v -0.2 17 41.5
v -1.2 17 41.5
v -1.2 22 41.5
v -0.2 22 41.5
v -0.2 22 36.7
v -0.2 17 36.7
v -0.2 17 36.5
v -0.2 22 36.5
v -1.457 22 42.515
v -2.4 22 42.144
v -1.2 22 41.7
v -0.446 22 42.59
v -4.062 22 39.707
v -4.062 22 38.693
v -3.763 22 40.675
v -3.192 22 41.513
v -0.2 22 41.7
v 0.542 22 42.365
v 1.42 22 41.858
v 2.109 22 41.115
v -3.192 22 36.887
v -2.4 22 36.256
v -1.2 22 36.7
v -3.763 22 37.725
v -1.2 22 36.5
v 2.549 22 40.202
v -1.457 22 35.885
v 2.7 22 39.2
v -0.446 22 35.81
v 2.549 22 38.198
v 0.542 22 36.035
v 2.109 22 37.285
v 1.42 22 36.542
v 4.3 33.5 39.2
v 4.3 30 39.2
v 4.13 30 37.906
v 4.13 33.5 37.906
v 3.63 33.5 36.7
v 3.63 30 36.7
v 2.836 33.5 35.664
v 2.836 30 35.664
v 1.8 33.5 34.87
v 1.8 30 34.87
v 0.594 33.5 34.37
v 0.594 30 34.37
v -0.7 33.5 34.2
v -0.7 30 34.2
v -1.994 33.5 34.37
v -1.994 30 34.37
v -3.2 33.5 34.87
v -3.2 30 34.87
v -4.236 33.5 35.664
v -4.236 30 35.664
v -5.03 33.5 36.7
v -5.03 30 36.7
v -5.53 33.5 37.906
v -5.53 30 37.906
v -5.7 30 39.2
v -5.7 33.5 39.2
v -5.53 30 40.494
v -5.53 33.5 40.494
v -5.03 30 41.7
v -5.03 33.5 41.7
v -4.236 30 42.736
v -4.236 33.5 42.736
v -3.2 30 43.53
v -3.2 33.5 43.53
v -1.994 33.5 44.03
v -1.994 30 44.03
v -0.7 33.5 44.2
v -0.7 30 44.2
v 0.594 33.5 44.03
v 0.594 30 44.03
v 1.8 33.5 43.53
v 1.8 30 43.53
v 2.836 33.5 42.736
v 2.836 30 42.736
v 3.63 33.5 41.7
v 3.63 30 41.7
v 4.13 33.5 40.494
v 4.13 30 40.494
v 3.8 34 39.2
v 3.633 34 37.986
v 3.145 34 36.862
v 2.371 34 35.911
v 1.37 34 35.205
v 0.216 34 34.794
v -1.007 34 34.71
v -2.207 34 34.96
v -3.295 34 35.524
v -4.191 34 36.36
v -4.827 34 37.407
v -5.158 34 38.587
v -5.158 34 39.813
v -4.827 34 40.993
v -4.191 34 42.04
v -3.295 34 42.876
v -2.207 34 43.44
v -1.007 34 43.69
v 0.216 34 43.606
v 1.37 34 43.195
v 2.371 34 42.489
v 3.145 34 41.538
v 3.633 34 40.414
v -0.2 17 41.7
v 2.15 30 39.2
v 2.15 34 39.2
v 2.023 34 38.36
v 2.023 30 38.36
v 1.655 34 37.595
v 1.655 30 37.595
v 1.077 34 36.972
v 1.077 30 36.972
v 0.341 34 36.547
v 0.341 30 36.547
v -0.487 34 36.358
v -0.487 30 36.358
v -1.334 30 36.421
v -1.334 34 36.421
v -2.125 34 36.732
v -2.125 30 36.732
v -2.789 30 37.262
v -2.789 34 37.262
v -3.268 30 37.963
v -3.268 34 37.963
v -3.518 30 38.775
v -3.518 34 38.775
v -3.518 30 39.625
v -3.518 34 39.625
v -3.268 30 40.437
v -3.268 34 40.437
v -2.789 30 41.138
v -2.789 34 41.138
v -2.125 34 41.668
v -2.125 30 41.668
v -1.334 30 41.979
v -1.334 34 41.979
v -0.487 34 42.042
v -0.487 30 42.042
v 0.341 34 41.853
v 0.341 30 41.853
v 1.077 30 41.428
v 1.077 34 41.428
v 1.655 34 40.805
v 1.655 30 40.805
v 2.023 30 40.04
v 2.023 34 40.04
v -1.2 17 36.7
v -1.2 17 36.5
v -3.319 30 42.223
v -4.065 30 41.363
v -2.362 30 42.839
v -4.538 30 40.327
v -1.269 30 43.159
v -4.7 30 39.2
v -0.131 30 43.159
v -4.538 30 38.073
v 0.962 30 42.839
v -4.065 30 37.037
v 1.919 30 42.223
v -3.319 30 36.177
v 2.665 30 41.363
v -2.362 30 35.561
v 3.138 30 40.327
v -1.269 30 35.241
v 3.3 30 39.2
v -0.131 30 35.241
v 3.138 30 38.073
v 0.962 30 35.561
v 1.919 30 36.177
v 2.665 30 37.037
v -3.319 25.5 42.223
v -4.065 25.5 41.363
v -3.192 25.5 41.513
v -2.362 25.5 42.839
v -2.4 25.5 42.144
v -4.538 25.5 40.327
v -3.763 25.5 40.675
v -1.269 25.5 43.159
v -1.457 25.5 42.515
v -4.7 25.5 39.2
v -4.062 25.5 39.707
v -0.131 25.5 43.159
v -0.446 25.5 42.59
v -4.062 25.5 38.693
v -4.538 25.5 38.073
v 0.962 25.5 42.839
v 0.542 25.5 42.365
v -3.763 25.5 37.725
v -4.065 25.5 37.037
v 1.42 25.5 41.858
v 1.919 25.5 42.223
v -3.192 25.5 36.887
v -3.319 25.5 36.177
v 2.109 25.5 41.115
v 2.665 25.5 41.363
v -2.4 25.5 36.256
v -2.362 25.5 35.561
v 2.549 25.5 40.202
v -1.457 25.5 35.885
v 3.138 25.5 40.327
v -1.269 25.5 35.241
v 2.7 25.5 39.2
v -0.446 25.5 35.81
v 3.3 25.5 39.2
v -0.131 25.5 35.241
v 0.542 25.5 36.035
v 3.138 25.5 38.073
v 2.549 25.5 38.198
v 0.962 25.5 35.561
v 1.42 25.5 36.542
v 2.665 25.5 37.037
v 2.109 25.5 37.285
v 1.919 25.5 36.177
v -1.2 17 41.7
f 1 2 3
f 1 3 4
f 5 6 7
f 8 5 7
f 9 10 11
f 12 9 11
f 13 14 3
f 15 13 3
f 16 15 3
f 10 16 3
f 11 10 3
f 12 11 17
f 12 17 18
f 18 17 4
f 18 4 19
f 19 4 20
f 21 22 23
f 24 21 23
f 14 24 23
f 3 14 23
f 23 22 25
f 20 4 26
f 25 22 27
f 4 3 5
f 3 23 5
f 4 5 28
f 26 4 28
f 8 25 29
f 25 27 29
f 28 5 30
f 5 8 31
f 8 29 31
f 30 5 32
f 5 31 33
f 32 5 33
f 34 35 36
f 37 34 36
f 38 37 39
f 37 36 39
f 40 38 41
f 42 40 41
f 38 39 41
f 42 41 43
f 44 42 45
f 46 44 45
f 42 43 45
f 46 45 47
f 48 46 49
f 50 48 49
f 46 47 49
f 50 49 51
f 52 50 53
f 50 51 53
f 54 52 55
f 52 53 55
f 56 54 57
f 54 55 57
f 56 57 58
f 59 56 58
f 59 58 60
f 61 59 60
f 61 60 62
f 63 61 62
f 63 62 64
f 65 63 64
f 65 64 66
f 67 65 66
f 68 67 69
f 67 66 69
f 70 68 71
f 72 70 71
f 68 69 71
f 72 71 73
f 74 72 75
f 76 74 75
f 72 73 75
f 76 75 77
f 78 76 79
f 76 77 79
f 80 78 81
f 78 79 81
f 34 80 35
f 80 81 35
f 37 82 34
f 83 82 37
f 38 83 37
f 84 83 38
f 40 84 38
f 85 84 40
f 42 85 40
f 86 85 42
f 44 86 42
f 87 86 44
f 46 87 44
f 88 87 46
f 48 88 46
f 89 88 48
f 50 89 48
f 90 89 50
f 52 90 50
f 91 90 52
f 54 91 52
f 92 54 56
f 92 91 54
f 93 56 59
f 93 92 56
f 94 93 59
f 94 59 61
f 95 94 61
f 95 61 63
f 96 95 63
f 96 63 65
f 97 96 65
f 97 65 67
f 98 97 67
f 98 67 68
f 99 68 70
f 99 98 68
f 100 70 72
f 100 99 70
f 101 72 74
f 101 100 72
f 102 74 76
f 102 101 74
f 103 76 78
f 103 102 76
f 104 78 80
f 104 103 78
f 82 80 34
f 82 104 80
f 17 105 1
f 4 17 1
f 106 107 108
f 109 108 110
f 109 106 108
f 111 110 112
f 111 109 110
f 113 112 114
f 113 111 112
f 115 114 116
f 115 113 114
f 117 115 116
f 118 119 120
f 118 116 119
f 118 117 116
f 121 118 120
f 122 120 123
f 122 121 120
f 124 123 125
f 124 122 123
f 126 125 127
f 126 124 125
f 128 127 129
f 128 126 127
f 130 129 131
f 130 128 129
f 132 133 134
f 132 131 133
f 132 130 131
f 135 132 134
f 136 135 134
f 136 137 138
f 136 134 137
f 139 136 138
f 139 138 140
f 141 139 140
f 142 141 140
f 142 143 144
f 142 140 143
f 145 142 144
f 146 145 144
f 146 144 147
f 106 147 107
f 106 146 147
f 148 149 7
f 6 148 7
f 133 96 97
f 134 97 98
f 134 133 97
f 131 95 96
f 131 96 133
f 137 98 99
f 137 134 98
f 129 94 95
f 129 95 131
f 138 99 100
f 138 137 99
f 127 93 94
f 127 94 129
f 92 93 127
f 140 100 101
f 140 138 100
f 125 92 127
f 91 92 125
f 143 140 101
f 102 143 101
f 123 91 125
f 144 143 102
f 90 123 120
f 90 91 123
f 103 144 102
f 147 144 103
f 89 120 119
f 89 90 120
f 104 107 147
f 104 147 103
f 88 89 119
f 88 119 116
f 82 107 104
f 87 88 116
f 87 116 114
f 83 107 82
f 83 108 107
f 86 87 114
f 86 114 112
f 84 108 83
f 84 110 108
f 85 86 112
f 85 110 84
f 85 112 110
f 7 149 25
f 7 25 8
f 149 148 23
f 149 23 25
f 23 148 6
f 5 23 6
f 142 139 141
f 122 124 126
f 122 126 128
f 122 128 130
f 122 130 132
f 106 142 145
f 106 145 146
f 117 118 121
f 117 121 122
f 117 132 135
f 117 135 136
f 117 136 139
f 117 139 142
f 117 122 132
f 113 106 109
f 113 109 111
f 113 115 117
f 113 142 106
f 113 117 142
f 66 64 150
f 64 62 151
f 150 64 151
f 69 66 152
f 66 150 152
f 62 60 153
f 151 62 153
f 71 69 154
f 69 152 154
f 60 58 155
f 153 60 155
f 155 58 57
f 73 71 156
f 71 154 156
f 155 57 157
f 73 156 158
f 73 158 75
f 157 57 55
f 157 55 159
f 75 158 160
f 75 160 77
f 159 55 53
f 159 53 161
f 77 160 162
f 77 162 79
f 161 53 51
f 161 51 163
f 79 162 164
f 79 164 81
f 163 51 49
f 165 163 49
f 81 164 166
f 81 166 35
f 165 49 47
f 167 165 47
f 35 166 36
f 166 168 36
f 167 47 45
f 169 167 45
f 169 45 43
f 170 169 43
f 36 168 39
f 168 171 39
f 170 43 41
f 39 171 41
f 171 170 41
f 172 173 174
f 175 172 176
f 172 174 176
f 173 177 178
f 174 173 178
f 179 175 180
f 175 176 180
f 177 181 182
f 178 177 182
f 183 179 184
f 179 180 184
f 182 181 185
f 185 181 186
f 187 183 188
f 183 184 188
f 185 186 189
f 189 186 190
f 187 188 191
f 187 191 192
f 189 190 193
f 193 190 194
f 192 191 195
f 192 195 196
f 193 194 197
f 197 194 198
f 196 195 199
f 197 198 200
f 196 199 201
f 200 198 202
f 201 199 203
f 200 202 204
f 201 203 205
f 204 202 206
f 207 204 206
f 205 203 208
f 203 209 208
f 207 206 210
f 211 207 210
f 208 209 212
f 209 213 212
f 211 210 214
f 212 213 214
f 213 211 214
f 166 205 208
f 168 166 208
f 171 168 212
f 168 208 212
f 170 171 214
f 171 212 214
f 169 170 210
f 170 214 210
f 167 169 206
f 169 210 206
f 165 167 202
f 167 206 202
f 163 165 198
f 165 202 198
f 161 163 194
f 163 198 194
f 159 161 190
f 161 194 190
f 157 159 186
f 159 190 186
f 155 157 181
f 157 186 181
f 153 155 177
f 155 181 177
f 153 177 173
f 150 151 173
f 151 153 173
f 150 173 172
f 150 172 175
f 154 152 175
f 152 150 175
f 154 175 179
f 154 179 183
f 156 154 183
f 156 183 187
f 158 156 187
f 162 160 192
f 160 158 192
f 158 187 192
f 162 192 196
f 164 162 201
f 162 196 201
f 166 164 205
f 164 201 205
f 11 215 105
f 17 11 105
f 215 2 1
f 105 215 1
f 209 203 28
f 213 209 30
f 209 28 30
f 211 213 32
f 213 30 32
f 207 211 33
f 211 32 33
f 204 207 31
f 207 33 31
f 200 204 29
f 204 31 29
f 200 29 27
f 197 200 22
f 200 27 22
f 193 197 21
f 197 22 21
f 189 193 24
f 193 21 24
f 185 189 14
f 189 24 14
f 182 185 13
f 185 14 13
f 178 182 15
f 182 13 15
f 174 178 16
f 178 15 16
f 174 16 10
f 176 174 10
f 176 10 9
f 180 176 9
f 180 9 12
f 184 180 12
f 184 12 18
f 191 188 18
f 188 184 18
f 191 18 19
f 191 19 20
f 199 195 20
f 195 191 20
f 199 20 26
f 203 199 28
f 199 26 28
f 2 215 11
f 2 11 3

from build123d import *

# Parameters (mm, degrees)
CYLINDER003003_R     = 2.85
CYLINDER003003_DEPTH = 10
BOX001001004_W       = 1
BOX001001004_H       = 0.2
BOX001001004_DEPTH   = 5.1
CYLINDER002007_R     = 3.4
CYLINDER002007_DEPTH = 8.5
BOX001001005_W       = 1
BOX001001005_H       = 0.2
BOX001001005_DEPTH   = 5.1
CYLINDER004009_R     = 5
CYLINDER004009_DEPTH = 4
CHAMFER008_SIZE      = 0.5
CYLINDER001006_R     = 4
CYLINDER001006_DEPTH = 4.6
CUT003009_ROLL_ANGLE = -90


with BuildPart() as hole001:
    # Cylinder003003 → Cylinder003003 (new body)
    with BuildSketch(Plane.XY):
        Circle(CYLINDER003003_R)
    extrude(amount=CYLINDER003003_DEPTH)


with BuildPart() as contact003:
    # Box001001004 → Box001001004 (new body)
    with BuildSketch(Plane(origin=(-0.5, 2.5, -13), x_dir=(1, 0, 0), z_dir=(0, 0, 1))):
        with Locations((0.5, 0.1)):
            Rectangle(BOX001001004_W, BOX001001004_H)
    extrude(amount=BOX001001004_DEPTH)


with BuildPart() as cylinder002007:
    # Cylinder002007 → Cylinder002007 (new body)
    with BuildSketch(Plane.XY.offset(-8)):
        Circle(CYLINDER002007_R)
    extrude(amount=CYLINDER002007_DEPTH)


with BuildPart() as contact004:
    # Box001001005 → Box001001005 (new body)
    with BuildSketch(Plane(origin=(-0.5, -2.5, -13), x_dir=(1, 0, 0), z_dir=(0, 0, 1))):
        with Locations((0.5, 0.1)):
            Rectangle(BOX001001005_W, BOX001001005_H)
    extrude(amount=BOX001001005_DEPTH)


with BuildPart() as chamfer008:
    # Cylinder004009 → Cylinder004009 (new body)
    with BuildSketch(Plane.XY):
        Circle(CYLINDER004009_R)
    extrude(amount=CYLINDER004009_DEPTH)

    # Chamfer008
    chamfer008_edges = [chamfer008.edges().sort_by_distance(p)[0] for p in [
        (-5, 0, 4),
    ]]
    chamfer(chamfer008_edges, length=CHAMFER008_SIZE)


with BuildPart() as powerconnector:
    # Cylinder001006 → Cylinder001006 (new body)
    with BuildSketch(Plane.XY.offset(-4.5)):
        Circle(CYLINDER001006_R)
    extrude(amount=CYLINDER001006_DEPTH)

    # Fusion005: union contact003, Cylinder002007, contact004, Chamfer008
    add(contact003.part)
    add(cylinder002007.part)
    add(contact004.part)
    add(chamfer008.part)

    # Cut003009: cut hole001
    add(hole001.part, mode=Mode.SUBTRACT)


with BuildPart() as powerconnector_1:
    # Cut003009 roll: moved
    add(powerconnector.part.rotate(Axis((0, 0, 0), (1, 0, 0)), CUT003009_ROLL_ANGLE))


with BuildPart() as powerconnector_2:
    # Cut003009 placement: moved
    add(powerconnector_1.part.moved(Location((-0.7, 30, 39.2))))


solid = powerconnector_2.part
